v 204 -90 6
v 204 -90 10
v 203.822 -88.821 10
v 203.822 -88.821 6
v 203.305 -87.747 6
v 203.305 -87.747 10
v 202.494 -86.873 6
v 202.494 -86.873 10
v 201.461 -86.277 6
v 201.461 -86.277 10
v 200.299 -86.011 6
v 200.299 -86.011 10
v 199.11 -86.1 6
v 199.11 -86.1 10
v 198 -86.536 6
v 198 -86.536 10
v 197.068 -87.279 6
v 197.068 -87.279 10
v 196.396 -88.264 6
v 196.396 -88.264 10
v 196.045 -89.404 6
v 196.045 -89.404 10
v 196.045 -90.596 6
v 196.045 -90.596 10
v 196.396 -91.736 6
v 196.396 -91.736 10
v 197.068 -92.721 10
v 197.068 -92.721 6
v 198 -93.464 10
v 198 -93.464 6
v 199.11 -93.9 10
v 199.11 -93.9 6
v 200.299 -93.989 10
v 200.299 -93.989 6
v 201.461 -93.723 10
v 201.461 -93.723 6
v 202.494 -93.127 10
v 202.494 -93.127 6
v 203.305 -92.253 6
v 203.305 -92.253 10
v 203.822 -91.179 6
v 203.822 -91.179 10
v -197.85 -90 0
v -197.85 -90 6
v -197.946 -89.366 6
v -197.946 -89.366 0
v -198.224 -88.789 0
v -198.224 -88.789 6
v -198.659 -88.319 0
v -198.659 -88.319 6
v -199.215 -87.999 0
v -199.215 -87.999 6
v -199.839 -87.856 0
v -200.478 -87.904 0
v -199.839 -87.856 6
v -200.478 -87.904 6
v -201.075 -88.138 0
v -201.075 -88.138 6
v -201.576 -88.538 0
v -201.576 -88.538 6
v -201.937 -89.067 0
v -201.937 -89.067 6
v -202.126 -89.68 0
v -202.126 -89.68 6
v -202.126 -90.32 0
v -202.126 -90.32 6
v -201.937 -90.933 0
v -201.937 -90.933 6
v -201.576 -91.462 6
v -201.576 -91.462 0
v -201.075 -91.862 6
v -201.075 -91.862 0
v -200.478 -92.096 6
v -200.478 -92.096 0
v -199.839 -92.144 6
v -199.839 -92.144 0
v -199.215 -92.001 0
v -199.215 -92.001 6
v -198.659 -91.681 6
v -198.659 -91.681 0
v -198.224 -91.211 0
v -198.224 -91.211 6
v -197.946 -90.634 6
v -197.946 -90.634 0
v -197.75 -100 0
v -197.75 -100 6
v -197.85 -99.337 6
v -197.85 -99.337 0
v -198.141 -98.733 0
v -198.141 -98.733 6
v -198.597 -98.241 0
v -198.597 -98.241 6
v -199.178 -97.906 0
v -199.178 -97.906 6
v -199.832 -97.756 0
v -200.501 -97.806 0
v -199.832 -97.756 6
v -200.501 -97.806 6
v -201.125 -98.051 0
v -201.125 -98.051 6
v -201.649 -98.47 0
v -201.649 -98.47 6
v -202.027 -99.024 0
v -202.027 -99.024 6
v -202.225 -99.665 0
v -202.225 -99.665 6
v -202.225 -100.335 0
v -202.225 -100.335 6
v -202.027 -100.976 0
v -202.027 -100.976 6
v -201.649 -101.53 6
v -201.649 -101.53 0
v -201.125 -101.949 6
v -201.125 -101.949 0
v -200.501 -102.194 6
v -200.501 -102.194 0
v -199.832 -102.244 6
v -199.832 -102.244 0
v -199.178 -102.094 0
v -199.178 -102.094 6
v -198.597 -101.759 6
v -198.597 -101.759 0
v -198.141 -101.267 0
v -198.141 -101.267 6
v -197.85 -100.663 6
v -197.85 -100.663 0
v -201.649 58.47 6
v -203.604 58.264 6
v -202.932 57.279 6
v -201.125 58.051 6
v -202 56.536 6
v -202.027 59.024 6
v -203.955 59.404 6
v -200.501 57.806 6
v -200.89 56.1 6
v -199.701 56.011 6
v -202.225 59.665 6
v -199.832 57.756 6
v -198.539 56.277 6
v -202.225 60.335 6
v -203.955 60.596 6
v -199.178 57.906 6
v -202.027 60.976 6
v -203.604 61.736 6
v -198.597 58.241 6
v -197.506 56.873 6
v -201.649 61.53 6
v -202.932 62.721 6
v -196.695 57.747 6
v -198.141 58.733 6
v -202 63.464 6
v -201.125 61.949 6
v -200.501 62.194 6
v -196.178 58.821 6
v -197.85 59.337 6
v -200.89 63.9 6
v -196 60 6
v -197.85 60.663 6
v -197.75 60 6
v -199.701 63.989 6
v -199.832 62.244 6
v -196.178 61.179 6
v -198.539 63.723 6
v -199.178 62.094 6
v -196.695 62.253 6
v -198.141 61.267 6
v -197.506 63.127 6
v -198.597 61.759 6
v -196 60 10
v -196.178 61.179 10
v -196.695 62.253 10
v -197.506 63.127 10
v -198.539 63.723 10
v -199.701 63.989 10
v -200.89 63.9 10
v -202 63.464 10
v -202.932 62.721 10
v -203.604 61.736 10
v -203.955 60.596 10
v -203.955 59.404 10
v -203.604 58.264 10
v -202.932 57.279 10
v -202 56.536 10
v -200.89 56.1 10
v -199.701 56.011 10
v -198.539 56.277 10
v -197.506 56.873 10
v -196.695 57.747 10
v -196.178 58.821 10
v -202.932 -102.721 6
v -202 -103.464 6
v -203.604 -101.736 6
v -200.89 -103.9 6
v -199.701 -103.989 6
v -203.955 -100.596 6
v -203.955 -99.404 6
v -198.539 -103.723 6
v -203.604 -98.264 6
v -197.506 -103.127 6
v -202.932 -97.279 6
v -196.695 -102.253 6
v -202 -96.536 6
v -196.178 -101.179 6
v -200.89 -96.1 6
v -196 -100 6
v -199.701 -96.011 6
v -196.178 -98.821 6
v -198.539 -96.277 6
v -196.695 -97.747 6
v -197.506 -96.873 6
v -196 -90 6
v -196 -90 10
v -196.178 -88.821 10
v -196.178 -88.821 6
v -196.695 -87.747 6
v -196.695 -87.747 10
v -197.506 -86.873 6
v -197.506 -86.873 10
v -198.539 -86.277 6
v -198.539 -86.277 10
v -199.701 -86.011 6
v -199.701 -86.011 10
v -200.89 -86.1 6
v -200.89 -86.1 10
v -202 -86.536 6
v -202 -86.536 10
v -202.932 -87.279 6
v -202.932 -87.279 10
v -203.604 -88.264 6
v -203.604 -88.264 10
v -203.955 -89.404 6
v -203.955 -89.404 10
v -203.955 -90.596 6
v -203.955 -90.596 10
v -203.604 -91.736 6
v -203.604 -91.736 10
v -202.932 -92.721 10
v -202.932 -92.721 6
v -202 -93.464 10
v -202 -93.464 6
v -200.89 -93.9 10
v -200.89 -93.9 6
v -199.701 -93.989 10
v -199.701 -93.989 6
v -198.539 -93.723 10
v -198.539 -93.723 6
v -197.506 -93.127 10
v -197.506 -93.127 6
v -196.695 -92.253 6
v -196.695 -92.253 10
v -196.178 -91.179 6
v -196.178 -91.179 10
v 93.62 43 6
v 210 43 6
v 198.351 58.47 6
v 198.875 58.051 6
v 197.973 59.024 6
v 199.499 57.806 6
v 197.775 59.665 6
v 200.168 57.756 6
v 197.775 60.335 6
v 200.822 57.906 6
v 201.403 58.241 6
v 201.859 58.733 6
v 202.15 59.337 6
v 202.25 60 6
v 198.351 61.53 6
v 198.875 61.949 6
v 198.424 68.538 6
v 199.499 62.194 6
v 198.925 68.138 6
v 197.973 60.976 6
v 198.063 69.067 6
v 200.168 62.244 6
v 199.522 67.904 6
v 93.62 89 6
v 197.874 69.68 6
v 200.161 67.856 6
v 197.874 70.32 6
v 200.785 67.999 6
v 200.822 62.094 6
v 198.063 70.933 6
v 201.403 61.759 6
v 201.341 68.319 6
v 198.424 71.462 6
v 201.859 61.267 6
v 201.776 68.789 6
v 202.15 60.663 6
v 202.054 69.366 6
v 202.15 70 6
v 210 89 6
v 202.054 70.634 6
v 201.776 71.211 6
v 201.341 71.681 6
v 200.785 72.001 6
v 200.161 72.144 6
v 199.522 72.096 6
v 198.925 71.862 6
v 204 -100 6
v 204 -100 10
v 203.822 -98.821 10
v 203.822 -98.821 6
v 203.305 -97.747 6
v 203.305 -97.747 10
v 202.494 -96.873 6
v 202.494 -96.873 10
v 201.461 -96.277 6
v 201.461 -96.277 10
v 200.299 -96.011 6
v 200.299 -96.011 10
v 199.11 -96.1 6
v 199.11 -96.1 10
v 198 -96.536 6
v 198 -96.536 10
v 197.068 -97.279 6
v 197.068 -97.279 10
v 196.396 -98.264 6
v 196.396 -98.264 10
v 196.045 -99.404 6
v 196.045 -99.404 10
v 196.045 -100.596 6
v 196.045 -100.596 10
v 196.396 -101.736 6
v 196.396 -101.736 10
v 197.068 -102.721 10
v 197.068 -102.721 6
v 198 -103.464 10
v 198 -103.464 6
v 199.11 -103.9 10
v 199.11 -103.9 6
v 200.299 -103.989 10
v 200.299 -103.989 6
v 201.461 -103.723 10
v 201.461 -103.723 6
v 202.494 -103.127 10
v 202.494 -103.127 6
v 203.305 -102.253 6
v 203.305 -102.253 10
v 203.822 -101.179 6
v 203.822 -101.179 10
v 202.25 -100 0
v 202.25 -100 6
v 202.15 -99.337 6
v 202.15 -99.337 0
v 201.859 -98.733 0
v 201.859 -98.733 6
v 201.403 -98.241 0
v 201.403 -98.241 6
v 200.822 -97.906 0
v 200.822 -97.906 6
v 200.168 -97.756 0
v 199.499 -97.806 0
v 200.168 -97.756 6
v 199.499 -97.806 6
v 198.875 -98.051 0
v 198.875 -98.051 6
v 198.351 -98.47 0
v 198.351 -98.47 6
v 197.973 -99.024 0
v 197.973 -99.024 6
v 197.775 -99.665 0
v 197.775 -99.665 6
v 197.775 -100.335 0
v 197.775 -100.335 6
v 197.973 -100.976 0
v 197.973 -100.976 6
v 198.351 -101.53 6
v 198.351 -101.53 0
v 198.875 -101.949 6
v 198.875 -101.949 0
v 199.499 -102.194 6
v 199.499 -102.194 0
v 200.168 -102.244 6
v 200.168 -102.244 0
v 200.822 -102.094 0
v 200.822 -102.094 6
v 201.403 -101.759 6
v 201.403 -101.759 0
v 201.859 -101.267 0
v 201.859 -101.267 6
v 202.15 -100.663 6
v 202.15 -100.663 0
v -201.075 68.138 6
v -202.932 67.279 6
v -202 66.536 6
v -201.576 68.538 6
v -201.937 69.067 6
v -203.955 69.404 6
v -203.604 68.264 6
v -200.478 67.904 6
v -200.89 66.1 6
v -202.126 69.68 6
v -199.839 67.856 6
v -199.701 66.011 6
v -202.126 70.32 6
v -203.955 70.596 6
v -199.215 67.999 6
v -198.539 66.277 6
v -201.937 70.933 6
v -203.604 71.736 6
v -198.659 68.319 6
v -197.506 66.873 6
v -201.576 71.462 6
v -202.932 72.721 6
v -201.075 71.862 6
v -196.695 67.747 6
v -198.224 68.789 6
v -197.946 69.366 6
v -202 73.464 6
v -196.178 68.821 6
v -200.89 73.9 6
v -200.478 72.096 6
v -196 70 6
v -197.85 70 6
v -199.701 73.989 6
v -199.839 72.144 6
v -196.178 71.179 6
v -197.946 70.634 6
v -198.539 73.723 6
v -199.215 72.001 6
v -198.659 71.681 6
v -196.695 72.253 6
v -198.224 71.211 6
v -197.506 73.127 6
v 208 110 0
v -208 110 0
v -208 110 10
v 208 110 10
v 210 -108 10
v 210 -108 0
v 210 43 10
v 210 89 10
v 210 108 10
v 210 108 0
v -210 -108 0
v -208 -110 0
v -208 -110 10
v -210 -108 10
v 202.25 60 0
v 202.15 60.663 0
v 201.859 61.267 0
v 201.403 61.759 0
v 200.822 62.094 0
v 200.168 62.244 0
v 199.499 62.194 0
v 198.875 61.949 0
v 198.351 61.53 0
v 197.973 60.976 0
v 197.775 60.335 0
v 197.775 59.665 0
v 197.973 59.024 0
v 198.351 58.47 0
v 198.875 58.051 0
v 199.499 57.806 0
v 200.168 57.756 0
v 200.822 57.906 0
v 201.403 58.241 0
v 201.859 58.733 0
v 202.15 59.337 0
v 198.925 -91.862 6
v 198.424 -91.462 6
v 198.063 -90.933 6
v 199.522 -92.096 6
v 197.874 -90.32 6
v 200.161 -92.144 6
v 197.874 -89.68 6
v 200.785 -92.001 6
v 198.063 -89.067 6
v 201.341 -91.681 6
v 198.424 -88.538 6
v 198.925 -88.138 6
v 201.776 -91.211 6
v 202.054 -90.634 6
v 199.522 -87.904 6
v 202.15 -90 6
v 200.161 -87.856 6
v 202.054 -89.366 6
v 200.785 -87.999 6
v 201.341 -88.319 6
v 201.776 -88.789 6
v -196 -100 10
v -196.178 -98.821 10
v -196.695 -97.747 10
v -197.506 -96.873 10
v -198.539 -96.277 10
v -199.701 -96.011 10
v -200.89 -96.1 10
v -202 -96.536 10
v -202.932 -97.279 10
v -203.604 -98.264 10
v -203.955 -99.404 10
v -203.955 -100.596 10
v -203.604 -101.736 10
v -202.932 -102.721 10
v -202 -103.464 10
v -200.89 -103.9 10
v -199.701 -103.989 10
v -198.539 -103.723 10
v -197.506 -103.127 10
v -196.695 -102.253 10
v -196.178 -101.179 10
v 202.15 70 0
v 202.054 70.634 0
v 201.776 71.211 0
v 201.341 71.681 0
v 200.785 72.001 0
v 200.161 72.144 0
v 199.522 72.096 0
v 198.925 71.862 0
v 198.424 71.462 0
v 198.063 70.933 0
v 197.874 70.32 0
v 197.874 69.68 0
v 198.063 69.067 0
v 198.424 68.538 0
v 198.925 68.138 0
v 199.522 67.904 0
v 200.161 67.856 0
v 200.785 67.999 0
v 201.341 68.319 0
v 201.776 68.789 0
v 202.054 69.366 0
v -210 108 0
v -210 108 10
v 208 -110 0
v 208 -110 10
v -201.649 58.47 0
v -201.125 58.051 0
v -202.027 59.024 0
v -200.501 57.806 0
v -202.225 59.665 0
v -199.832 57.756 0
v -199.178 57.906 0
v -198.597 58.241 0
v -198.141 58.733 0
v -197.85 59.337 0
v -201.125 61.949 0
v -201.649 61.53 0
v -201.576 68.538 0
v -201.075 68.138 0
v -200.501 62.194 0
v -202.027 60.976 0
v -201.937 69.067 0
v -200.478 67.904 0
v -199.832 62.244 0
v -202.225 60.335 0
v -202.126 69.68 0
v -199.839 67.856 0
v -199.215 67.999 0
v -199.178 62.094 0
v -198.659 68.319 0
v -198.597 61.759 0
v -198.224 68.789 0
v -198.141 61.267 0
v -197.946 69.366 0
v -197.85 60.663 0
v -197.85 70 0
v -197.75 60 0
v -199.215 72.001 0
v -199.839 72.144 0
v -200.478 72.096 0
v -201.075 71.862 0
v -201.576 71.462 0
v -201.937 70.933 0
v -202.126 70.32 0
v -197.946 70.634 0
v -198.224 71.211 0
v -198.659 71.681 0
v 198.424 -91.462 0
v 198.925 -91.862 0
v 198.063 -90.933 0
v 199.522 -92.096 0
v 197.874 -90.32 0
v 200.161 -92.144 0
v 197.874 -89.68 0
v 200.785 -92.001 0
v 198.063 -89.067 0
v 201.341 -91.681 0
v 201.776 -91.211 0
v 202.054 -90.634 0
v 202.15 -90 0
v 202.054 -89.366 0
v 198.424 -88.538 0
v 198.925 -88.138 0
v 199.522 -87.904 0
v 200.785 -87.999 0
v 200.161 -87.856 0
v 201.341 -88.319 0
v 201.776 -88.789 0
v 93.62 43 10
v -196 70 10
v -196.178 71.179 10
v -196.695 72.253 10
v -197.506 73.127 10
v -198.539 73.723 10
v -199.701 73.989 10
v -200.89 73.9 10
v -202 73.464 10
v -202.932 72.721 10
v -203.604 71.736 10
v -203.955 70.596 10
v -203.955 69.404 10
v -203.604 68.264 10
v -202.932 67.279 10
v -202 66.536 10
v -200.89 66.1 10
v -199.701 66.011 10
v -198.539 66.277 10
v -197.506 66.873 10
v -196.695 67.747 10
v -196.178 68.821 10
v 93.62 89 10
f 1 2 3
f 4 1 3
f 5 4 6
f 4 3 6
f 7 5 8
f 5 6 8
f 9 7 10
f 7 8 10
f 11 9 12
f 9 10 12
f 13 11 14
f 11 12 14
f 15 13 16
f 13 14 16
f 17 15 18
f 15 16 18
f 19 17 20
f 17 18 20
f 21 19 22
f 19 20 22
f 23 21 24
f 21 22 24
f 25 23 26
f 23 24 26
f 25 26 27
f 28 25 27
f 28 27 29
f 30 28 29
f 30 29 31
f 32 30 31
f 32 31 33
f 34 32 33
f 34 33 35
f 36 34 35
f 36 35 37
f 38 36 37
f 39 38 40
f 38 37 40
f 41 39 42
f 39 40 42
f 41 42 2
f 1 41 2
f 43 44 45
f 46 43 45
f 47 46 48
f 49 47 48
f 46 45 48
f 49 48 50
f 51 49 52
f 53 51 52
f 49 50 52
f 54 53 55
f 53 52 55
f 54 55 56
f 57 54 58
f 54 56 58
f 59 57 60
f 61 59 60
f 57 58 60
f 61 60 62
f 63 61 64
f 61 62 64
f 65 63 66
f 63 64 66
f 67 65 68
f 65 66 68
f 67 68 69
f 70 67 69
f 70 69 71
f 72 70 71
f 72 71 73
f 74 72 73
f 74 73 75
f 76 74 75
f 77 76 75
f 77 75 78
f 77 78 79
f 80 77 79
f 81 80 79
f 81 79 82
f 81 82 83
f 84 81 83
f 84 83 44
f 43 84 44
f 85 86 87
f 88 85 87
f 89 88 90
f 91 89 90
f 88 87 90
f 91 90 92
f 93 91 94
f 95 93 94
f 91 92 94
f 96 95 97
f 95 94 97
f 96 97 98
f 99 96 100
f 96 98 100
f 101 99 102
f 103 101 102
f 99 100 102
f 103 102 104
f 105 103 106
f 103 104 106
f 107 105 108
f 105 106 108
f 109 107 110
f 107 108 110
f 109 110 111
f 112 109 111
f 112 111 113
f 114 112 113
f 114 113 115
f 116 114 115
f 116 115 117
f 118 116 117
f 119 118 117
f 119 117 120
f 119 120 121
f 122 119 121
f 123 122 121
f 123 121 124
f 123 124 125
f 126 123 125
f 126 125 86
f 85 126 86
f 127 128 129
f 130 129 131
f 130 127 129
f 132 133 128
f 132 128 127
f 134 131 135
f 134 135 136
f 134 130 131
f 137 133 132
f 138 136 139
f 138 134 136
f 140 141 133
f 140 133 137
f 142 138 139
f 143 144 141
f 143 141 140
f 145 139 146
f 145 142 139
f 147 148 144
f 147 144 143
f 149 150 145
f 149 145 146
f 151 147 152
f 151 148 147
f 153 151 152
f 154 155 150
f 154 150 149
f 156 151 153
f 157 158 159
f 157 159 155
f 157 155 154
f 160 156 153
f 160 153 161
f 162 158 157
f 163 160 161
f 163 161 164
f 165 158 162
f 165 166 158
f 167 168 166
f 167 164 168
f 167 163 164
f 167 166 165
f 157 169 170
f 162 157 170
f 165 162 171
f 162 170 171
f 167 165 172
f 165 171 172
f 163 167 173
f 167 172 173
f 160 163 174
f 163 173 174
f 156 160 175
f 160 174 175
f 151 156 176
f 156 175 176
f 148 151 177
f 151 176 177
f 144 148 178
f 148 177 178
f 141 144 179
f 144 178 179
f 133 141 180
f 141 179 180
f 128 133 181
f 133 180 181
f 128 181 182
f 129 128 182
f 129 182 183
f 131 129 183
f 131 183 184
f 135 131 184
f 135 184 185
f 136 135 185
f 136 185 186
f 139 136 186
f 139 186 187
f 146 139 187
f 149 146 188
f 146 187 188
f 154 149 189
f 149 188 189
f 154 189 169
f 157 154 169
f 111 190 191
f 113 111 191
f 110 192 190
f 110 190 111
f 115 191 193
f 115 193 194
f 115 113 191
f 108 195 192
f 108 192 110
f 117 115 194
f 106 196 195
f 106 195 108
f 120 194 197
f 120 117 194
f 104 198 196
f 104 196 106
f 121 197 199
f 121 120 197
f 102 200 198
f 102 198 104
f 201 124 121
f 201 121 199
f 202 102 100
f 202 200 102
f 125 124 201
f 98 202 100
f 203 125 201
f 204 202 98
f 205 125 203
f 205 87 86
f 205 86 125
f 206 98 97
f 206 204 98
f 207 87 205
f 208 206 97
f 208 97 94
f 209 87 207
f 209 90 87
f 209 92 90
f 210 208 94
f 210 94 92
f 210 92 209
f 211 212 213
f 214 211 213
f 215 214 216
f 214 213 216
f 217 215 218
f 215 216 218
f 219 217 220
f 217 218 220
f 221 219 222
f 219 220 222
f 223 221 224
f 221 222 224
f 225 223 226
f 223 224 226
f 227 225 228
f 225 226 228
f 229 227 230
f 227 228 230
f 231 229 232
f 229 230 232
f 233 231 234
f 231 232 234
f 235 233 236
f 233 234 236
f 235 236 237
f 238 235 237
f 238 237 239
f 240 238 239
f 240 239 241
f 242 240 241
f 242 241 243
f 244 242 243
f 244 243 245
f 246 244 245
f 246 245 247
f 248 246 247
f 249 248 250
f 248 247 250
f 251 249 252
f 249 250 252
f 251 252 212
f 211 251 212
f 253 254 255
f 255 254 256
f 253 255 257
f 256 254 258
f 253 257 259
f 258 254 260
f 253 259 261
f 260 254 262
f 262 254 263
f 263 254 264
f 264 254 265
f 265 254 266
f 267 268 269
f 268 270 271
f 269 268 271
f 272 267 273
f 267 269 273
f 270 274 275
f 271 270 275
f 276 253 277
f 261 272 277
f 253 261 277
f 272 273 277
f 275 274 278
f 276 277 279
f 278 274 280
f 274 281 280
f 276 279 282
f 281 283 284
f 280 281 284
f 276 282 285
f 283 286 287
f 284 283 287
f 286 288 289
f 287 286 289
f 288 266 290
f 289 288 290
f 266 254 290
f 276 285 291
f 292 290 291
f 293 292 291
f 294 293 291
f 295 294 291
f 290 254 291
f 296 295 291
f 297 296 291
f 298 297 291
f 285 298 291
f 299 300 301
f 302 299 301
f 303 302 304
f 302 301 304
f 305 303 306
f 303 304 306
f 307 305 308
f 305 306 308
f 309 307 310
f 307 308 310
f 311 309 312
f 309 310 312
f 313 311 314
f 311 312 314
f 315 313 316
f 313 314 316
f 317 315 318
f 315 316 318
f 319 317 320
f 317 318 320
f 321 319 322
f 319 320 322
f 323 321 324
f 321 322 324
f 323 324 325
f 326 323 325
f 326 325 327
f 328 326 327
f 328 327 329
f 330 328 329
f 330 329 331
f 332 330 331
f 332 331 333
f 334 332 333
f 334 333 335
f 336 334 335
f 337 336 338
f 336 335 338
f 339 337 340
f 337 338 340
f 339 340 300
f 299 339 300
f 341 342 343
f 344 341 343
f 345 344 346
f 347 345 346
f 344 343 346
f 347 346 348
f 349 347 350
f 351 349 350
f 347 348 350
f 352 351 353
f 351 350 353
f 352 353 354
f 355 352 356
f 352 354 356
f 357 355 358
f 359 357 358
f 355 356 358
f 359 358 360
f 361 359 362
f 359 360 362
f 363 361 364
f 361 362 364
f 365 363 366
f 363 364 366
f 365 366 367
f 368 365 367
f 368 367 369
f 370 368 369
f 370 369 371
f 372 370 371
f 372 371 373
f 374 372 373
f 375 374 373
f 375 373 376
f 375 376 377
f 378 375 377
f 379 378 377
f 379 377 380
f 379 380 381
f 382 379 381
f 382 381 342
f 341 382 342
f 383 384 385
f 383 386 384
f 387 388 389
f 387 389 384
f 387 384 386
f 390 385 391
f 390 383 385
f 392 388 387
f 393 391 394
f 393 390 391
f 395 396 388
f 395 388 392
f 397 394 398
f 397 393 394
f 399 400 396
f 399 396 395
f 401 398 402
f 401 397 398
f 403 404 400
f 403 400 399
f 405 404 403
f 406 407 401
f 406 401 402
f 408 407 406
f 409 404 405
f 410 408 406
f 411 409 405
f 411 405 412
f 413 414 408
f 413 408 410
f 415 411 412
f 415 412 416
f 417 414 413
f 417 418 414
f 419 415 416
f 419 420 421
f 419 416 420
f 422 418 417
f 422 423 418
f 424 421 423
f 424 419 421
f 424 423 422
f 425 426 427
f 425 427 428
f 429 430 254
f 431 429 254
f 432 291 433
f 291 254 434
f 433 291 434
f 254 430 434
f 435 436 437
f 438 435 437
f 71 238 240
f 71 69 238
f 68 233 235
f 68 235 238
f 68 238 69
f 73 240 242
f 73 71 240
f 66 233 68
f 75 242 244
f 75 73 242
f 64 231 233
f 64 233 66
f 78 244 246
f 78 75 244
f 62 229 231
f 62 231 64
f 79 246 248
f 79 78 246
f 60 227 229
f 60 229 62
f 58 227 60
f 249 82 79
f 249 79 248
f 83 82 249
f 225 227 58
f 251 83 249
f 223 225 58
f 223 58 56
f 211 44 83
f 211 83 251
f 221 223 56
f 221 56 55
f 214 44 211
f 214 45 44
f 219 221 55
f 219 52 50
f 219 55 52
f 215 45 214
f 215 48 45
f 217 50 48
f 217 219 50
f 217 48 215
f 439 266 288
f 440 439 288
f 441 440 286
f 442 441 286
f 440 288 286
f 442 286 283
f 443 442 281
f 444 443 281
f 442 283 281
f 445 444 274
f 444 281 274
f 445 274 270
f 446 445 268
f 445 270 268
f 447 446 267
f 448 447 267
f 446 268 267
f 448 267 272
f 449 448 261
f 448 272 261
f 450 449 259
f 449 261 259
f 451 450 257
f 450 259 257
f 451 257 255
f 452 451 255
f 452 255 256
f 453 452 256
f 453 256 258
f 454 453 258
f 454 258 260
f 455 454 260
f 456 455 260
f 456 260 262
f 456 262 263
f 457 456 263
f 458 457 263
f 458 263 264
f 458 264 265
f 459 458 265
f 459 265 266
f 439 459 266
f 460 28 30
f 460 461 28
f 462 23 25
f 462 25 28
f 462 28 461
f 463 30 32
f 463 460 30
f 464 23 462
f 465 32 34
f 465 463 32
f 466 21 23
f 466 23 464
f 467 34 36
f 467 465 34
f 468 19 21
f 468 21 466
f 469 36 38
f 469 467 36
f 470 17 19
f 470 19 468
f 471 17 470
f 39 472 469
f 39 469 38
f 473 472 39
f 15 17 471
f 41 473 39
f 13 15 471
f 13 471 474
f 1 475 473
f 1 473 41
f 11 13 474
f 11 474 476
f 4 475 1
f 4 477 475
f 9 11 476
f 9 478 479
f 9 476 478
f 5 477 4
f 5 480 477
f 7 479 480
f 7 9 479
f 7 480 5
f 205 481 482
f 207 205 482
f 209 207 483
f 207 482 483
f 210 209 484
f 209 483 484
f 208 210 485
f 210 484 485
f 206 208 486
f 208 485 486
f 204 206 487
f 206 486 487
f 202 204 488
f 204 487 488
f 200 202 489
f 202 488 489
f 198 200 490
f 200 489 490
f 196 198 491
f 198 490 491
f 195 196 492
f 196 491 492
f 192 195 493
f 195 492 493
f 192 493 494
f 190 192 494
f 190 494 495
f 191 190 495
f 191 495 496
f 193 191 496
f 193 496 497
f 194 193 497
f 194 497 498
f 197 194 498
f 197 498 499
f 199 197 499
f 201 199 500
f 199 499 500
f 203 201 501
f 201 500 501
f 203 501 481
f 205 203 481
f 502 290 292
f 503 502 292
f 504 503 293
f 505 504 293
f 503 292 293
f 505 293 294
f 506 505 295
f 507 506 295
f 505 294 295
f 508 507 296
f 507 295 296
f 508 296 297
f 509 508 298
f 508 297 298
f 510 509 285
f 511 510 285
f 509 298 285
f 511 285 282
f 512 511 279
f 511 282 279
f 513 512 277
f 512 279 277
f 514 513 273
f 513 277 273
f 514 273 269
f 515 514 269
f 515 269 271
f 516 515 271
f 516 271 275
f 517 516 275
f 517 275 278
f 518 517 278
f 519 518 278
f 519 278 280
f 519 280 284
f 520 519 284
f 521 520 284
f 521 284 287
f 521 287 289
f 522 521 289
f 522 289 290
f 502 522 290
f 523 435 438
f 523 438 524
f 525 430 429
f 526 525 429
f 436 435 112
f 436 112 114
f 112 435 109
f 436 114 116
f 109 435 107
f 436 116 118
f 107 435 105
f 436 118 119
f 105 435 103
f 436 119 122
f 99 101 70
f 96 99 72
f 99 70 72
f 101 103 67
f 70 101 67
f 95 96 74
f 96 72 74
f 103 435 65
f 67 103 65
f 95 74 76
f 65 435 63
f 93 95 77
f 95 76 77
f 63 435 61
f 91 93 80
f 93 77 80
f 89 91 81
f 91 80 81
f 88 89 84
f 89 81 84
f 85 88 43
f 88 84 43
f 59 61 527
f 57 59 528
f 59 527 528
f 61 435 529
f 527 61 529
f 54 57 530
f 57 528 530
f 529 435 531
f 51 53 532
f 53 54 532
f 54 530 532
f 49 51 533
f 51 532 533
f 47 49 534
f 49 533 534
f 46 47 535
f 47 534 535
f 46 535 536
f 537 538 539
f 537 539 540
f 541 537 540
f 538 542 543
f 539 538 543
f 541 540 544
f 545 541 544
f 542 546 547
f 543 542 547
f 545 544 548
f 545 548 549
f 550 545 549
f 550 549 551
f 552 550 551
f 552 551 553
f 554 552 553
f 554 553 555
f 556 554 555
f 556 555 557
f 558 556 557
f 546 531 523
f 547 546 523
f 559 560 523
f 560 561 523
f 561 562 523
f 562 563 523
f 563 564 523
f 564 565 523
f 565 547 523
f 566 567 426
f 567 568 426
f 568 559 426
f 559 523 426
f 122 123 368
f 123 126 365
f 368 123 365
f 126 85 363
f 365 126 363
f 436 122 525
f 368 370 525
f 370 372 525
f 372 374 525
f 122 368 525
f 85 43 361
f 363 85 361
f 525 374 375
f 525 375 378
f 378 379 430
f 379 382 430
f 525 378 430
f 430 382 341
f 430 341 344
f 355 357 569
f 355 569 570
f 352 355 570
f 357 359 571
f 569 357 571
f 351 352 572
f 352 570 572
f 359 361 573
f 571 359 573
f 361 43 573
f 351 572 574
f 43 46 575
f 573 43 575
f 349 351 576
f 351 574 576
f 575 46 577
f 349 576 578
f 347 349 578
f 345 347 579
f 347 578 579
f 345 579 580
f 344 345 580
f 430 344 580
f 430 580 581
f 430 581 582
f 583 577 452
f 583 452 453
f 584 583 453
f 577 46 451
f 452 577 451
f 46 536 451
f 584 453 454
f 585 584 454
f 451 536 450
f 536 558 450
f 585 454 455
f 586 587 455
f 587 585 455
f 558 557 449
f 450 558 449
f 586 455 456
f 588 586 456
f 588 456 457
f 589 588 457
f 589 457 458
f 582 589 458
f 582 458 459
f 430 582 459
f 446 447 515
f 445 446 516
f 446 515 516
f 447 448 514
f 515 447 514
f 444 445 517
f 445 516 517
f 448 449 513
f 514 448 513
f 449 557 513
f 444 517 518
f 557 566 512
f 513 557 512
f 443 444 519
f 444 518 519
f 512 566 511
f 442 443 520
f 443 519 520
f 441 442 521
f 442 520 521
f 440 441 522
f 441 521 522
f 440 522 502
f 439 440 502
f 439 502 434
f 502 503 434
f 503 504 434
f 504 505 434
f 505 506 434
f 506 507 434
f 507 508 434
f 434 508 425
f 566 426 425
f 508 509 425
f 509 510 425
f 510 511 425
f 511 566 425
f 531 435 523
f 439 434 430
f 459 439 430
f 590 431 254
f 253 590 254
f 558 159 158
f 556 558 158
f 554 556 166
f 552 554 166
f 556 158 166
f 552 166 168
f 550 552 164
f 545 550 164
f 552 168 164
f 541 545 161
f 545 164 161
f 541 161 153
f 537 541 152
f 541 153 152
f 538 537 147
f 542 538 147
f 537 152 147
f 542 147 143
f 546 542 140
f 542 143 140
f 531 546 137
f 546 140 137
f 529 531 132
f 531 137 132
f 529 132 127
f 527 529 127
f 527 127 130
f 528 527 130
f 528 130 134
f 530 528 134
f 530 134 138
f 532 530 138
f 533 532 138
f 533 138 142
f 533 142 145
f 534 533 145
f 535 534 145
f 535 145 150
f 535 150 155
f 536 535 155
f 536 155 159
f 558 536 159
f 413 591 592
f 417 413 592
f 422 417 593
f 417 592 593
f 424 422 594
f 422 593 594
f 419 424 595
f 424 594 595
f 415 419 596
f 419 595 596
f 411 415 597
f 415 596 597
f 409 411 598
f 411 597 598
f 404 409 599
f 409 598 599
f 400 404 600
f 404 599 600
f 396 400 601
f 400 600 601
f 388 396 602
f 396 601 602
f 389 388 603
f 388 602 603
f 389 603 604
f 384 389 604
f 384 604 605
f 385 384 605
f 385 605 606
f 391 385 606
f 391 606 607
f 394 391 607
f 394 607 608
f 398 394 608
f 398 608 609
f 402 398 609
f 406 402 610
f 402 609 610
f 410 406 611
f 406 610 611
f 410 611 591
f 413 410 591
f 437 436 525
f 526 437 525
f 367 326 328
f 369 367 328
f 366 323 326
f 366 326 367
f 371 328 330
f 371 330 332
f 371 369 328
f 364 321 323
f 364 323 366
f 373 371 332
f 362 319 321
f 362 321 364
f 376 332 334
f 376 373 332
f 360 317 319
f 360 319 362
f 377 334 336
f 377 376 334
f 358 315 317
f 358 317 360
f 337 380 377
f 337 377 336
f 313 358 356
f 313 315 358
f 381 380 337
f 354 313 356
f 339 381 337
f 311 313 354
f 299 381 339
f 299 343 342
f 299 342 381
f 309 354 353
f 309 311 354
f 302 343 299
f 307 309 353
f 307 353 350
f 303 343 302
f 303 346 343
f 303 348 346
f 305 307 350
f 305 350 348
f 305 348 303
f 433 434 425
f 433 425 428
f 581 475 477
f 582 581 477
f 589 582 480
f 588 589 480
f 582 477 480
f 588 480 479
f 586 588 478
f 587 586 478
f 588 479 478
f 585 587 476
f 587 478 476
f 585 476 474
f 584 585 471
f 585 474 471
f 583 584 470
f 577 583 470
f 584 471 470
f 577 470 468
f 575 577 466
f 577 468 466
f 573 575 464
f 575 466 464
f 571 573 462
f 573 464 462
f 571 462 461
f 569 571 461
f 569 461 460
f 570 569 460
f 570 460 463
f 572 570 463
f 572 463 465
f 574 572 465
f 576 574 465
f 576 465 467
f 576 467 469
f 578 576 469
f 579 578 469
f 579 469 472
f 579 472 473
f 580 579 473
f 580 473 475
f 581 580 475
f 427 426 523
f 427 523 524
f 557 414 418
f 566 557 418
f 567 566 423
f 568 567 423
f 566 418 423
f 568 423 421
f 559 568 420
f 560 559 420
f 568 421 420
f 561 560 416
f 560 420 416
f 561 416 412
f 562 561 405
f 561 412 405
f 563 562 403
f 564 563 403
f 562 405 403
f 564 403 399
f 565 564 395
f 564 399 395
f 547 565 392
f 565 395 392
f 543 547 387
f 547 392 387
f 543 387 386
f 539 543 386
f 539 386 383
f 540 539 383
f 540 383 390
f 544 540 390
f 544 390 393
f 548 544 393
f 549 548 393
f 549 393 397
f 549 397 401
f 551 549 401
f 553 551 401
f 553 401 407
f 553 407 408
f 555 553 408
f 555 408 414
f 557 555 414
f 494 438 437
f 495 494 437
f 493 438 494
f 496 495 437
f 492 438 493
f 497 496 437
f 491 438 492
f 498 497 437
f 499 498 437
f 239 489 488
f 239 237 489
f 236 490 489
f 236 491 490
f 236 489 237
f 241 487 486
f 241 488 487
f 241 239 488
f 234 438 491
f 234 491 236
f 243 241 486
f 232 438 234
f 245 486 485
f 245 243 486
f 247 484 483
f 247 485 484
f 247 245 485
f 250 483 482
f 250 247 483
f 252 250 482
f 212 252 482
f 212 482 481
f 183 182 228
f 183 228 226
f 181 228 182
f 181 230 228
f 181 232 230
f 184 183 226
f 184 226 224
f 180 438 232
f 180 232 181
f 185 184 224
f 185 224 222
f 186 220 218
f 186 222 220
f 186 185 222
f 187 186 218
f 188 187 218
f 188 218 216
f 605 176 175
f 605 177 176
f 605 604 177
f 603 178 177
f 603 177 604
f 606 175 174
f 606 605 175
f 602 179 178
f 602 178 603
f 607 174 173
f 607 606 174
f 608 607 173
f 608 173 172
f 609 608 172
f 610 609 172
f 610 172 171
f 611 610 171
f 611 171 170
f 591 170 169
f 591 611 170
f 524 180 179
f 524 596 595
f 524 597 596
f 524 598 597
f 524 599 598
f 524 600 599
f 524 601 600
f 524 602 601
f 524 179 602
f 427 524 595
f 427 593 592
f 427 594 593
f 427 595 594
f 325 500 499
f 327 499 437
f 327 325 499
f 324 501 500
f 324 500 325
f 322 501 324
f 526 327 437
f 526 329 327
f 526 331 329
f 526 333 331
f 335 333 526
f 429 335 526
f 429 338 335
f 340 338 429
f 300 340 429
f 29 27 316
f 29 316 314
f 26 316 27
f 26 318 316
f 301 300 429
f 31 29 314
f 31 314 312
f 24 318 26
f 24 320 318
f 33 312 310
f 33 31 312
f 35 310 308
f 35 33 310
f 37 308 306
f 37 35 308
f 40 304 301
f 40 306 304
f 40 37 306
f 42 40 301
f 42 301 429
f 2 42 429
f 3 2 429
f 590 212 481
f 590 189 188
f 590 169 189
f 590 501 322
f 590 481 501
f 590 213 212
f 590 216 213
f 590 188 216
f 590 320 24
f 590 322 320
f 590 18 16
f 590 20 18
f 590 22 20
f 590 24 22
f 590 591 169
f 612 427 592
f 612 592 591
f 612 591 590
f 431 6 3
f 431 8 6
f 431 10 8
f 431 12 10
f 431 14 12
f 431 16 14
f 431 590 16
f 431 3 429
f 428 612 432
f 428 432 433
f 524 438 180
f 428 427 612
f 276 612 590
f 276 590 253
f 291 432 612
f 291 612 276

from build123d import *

# Parameters (mm, degrees)
SKETCH1_W           = 420
SKETCH1_H           = 220
BOSS_EXTRUDE1_DEPTH = 10
SKETCH2_R           = 2.25
CUT_EXTRUDE1_DEPTH  = 10
SKETCH3_R           = 4
CUT_EXTRUDE2_DEPTH  = 4
CHAMFER1_SIZE       = 2
SKETCH5_W           = 4
SKETCH5_H           = 46
CUT_EXTRUDE3_DEPTH  = 116.38
SKETCH7_R           = 2.15
CUT_EXTRUDE4_DEPTH  = 11
SKETCH8_R           = 4
CUT_EXTRUDE5_DEPTH  = 4


with BuildPart() as part:
    # Sketch1 → Boss-Extrude1 (new body)
    with BuildSketch(Plane.XY):
        Rectangle(SKETCH1_W, SKETCH1_H)
    extrude(amount=BOSS_EXTRUDE1_DEPTH)

    # Sketch2 → Cut-Extrude1 (cut)
    with BuildSketch(Plane.XY.offset(10)):
        with Locations((-200, 60)):
            Circle(SKETCH2_R)
        with Locations((200, 60)):
            Circle(SKETCH2_R)
        with Locations((200, -100)):
            Circle(SKETCH2_R)
        with Locations((-200, -100)):
            Circle(SKETCH2_R)
    extrude(amount=-CUT_EXTRUDE1_DEPTH, mode=Mode.SUBTRACT)

    # Sketch3 → Cut-Extrude2 (cut)
    with BuildSketch(Plane.XY.offset(10)):
        with Locations((-200, 60)):
            Circle(SKETCH3_R)
        with Locations((-200, -100)):
            Circle(SKETCH3_R)
        with Locations((200, 60)):
            Circle(SKETCH3_R)
        with Locations((200, -100)):
            Circle(SKETCH3_R)
    extrude(amount=-CUT_EXTRUDE2_DEPTH, mode=Mode.SUBTRACT)

    # Chamfer1
    chamfer1_edges = [part.edges().sort_by_distance(p)[0] for p in [
        (210, -110, 5),
        (-210, -110, 5),
        (-210, 110, 5),
        (210, 110, 5),
    ]]
    chamfer(chamfer1_edges, length=CHAMFER1_SIZE)

    # Sketch5 → Cut-Extrude3 (cut)
    with BuildSketch(Plane(origin=(210, 0, 0), x_dir=(0, 0, -1), z_dir=(1, 0, 0))):
        with Locations((-8, 66)):
            Rectangle(SKETCH5_W, SKETCH5_H)
    extrude(amount=-CUT_EXTRUDE3_DEPTH, mode=Mode.SUBTRACT)

    # Sketch7 → Cut-Extrude4 (cut, through all)
    with BuildSketch(Plane.XY.offset(10)):
        with Locations((200, -90)):
            Circle(SKETCH7_R)
        with Locations((200, 70)):
            Circle(SKETCH7_R)
        with Locations((-200, -90)):
            Circle(SKETCH7_R)
        with Locations((-200, 70)):
            Circle(SKETCH7_R)
    extrude(amount=-CUT_EXTRUDE4_DEPTH, mode=Mode.SUBTRACT)

    # Sketch8 → Cut-Extrude5 (cut)
    with BuildSketch(Plane.XY.offset(10)):
        with Locations((-200, 70)):
            Circle(SKETCH8_R)
        with Locations((-200, -90)):
            Circle(SKETCH8_R)
        with Locations((200, -90)):
            Circle(SKETCH8_R)
    extrude(amount=-CUT_EXTRUDE5_DEPTH, mode=Mode.SUBTRACT)


solid = part.part
